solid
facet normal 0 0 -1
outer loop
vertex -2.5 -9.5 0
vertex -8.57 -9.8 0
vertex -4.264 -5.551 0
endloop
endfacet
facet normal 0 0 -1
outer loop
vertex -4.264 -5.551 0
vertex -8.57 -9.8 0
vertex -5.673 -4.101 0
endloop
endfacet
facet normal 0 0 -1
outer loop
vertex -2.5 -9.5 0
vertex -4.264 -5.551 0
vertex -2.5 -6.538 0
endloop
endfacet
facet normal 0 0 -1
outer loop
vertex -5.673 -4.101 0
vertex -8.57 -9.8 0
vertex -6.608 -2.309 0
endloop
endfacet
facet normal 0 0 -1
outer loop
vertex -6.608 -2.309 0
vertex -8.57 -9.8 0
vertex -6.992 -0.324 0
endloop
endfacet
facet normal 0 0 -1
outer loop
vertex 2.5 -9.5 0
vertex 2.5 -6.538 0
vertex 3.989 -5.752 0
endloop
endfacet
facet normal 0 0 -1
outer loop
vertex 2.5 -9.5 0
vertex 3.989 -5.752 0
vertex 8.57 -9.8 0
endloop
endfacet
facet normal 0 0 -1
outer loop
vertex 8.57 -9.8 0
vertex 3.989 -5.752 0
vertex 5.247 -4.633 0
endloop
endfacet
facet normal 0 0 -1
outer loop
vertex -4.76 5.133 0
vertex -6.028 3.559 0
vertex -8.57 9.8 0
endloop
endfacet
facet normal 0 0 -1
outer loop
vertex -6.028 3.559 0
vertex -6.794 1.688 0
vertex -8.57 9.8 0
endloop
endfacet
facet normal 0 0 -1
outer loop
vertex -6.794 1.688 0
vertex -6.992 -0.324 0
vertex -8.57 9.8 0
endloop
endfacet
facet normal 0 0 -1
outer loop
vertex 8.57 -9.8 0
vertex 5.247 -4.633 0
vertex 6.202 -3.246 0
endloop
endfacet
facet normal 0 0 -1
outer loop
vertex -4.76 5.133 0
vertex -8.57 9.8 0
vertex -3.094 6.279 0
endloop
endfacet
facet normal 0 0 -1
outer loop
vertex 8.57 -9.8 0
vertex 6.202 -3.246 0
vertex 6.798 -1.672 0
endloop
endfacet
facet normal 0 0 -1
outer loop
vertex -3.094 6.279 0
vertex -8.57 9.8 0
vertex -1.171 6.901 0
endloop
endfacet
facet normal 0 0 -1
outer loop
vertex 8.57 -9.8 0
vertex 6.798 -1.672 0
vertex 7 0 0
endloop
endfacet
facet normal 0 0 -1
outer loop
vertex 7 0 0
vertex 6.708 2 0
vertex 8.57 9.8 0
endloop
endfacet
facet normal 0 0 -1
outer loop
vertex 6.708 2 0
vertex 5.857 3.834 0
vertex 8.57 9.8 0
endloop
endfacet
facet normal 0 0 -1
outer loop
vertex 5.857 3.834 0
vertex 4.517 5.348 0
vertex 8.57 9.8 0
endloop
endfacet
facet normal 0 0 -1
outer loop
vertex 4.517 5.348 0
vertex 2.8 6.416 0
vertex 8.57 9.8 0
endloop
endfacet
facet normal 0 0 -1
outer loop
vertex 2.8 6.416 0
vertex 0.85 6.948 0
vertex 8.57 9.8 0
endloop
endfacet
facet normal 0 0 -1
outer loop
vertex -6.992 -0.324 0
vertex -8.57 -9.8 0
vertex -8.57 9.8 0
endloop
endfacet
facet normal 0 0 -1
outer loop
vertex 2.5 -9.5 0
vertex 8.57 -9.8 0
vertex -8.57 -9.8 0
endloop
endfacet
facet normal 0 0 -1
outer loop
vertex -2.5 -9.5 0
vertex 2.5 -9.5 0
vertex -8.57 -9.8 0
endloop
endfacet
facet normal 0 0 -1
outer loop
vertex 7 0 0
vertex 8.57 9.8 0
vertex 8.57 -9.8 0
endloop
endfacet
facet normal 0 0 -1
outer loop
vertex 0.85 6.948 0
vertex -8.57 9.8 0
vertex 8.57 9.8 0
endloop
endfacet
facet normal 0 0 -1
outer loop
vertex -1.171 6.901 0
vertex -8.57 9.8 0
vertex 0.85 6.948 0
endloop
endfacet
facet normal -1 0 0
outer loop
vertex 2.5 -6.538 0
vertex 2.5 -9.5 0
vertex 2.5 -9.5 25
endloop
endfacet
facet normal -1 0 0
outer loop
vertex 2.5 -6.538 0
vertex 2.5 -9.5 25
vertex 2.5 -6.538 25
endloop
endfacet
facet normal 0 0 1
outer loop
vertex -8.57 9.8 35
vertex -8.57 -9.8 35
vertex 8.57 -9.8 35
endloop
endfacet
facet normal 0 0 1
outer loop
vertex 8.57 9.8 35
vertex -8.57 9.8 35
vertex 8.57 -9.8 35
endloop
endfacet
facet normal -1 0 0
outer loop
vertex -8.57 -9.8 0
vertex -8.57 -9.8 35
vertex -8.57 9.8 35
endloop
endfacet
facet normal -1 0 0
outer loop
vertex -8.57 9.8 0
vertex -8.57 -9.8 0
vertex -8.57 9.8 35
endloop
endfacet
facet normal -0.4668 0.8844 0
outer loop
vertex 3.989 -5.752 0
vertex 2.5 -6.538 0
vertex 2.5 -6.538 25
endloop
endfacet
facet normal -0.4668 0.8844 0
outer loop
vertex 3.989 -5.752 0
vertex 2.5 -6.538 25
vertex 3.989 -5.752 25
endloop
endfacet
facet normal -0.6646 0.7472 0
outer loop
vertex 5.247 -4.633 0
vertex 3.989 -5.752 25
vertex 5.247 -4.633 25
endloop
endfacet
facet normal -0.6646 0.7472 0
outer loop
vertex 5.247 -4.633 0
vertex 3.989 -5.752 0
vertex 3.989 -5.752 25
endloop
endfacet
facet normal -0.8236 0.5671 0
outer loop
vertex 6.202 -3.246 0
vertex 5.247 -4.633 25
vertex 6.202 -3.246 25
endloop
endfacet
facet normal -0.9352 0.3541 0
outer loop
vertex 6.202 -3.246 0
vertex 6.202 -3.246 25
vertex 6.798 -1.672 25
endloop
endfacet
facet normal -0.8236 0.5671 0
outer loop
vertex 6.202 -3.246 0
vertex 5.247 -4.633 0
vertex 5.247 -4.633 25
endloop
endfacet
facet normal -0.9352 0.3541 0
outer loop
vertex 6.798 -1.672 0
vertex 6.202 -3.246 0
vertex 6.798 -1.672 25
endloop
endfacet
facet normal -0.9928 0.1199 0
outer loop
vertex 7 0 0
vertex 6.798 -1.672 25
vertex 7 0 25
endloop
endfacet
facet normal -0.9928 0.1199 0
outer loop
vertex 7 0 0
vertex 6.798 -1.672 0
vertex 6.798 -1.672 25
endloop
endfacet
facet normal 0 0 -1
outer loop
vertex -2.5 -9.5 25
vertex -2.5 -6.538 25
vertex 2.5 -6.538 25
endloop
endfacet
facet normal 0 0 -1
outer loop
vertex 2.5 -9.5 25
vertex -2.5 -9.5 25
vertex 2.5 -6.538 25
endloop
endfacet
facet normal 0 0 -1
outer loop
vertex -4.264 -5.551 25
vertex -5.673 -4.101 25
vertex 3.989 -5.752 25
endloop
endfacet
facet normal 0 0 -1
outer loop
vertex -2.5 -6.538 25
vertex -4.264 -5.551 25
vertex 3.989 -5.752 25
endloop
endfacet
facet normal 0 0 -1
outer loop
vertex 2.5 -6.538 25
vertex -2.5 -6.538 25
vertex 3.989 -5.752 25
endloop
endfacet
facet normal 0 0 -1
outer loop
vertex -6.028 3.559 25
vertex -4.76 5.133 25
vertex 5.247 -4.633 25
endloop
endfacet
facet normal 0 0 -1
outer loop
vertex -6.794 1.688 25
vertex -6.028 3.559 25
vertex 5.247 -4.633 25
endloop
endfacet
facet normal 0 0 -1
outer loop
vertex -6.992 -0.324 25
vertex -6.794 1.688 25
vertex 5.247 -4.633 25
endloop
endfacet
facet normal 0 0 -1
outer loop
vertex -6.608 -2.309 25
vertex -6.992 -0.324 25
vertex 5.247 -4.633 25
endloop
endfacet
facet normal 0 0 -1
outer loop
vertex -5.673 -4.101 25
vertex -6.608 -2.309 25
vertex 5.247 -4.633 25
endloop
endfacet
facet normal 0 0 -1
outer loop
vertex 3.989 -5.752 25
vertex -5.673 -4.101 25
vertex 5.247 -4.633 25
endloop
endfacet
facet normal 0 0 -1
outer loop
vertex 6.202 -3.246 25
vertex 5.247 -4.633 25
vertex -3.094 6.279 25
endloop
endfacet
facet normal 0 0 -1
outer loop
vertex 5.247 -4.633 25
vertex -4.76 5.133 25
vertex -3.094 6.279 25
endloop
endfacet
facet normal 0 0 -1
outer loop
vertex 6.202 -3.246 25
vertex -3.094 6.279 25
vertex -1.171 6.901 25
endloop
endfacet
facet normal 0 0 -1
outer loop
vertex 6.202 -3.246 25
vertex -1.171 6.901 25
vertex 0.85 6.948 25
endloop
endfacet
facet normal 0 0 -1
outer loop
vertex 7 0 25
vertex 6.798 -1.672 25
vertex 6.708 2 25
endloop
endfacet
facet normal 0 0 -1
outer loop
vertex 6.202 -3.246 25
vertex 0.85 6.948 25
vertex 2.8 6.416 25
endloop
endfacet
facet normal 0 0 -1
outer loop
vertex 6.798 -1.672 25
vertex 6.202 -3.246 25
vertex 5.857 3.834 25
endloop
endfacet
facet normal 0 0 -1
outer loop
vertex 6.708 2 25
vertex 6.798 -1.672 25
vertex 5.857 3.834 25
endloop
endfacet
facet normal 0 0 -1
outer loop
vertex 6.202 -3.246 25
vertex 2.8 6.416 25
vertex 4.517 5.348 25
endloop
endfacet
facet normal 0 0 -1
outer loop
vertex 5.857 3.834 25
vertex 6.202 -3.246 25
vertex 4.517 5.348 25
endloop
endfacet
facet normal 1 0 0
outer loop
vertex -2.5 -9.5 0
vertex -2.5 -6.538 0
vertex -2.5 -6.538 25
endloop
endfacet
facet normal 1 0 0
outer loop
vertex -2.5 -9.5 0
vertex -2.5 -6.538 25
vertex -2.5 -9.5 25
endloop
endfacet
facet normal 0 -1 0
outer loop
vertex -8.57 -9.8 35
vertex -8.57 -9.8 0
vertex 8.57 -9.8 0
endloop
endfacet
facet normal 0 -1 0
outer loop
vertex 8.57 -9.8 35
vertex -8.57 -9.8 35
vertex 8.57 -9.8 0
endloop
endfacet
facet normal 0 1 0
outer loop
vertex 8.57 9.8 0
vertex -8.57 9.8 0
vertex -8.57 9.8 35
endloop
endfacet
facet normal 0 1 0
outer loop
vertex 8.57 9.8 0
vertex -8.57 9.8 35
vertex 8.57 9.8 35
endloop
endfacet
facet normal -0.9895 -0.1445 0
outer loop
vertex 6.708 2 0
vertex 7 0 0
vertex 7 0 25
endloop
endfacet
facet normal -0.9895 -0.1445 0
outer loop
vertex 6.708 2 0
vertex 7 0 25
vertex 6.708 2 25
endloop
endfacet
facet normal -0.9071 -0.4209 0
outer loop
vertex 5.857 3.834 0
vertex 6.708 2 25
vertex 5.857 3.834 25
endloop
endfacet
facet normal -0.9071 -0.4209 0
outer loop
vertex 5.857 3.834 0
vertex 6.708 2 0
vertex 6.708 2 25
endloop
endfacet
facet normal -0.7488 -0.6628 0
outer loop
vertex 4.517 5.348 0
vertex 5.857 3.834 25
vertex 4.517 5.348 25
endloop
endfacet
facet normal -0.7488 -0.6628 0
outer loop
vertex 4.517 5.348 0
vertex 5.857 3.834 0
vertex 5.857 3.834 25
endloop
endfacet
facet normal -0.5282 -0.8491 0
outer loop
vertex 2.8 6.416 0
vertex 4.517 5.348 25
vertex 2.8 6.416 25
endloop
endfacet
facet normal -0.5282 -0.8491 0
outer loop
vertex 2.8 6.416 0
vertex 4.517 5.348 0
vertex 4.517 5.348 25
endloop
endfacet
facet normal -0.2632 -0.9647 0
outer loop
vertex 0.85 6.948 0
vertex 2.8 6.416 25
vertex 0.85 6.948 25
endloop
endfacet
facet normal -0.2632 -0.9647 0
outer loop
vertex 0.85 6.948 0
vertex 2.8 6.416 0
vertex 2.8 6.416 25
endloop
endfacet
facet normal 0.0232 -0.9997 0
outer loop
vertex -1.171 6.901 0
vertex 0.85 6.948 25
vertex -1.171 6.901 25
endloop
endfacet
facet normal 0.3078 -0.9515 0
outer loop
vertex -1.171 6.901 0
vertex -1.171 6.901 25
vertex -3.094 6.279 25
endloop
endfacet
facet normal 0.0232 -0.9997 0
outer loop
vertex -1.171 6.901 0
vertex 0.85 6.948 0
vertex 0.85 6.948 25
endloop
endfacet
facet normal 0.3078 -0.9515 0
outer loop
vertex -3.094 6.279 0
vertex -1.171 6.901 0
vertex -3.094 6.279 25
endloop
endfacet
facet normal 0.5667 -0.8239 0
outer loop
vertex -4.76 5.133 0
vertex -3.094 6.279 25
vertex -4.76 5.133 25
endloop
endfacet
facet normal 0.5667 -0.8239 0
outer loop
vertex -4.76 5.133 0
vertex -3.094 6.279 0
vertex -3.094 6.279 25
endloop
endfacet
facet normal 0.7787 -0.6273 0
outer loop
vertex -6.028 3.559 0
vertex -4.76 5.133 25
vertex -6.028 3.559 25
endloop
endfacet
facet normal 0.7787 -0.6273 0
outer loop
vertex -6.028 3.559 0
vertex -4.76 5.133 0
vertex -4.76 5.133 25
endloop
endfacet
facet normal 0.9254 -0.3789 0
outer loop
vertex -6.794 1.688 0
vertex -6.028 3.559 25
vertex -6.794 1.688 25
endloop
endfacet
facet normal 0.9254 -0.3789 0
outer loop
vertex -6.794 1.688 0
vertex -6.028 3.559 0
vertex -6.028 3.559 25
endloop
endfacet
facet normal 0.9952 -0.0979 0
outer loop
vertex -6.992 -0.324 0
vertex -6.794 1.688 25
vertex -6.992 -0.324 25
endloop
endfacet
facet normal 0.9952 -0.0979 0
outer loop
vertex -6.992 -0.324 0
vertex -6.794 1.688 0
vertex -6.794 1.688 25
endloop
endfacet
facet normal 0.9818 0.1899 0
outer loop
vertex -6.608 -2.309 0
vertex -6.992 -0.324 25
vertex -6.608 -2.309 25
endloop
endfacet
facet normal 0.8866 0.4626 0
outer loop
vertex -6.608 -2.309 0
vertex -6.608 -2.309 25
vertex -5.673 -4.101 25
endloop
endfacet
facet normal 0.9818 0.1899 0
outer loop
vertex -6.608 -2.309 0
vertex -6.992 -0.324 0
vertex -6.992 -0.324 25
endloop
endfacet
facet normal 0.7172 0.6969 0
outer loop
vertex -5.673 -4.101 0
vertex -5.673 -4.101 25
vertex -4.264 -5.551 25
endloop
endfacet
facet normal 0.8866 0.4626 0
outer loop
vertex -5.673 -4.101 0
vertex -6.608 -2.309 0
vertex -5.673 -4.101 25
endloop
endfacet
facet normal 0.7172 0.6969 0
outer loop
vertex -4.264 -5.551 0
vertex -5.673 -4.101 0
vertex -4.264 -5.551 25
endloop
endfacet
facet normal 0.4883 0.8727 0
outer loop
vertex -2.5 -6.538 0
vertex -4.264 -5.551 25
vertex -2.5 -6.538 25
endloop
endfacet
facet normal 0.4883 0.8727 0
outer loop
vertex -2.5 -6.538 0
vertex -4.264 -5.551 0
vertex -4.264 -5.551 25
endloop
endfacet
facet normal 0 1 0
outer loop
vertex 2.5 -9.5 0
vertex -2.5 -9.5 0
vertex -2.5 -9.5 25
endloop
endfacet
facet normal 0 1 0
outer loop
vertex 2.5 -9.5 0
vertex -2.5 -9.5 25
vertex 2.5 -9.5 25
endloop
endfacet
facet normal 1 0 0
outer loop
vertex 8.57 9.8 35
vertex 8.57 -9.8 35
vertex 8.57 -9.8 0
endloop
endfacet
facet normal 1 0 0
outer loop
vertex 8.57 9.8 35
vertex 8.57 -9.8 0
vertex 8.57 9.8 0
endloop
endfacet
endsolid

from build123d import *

# Parameters (mm, degrees)
F0_W     = 17.1407087726
F0_H     = 19.5990015107
F1_DEPTH = 35
F2_DEPTH = 25


with BuildPart() as f1:
    # F0 (on Top) → F1 (new body)
    with BuildSketch(Plane.XY):
        Rectangle(F0_W, F0_H)
        with BuildLine():
            ThreePointArc((-2.5, -6.5383484153), (-3.9686269666, 5.7662812973), (7, 0))
            ThreePointArc((7, 0), (5.7662812973, -3.9686269666), (2.5, -6.5383484153))
            Line((2.5, -6.5383484153), (2.5, -9.5))
            Line((2.5, -9.5), (0, -9.5))
            Line((0, -9.5), (-2.5, -9.5))
            Line((-2.5, -9.5), (-2.5, -6.5383484153))
        make_face(mode=Mode.SUBTRACT)
        with BuildLine():
            ThreePointArc((2.5, -6.5383484153), (5.7662812973, -3.9686269666), (7, 0))
            ThreePointArc((7, 0), (-3.9686269666, 5.7662812973), (-2.5, -6.5383484153))
            ThreePointArc((-2.5, -6.5383484153), (0, -7), (2.5, -6.5383484153))
        make_face()
        with BuildLine():
            ThreePointArc((2.5, -6.5383484153), (0, -7), (-2.5, -6.5383484153))
            Line((-2.5, -6.5383484153), (-2.5, -9.5))
            Line((-2.5, -9.5), (0, -9.5))
            Line((0, -9.5), (2.5, -9.5))
            Line((2.5, -9.5), (2.5, -6.5383484153))
        make_face()
    extrude(amount=F1_DEPTH)

    # F0 (on Top) → F2 (cut)
    with BuildSketch(Plane.XY):
        with BuildLine():
            ThreePointArc((2.5, -6.5383484153), (5.7662812973, -3.9686269666), (7, 0))
            ThreePointArc((7, 0), (-3.9686269666, 5.7662812973), (-2.5, -6.5383484153))
            ThreePointArc((-2.5, -6.5383484153), (0, -7), (2.5, -6.5383484153))
        make_face()
        with BuildLine():
            ThreePointArc((2.5, -6.5383484153), (0, -7), (-2.5, -6.5383484153))
            Line((-2.5, -6.5383484153), (-2.5, -9.5))
            Line((-2.5, -9.5), (0, -9.5))
            Line((0, -9.5), (2.5, -9.5))
            Line((2.5, -9.5), (2.5, -6.5383484153))
        make_face()
    extrude(amount=F2_DEPTH, mode=Mode.SUBTRACT)


solid = f1.part
